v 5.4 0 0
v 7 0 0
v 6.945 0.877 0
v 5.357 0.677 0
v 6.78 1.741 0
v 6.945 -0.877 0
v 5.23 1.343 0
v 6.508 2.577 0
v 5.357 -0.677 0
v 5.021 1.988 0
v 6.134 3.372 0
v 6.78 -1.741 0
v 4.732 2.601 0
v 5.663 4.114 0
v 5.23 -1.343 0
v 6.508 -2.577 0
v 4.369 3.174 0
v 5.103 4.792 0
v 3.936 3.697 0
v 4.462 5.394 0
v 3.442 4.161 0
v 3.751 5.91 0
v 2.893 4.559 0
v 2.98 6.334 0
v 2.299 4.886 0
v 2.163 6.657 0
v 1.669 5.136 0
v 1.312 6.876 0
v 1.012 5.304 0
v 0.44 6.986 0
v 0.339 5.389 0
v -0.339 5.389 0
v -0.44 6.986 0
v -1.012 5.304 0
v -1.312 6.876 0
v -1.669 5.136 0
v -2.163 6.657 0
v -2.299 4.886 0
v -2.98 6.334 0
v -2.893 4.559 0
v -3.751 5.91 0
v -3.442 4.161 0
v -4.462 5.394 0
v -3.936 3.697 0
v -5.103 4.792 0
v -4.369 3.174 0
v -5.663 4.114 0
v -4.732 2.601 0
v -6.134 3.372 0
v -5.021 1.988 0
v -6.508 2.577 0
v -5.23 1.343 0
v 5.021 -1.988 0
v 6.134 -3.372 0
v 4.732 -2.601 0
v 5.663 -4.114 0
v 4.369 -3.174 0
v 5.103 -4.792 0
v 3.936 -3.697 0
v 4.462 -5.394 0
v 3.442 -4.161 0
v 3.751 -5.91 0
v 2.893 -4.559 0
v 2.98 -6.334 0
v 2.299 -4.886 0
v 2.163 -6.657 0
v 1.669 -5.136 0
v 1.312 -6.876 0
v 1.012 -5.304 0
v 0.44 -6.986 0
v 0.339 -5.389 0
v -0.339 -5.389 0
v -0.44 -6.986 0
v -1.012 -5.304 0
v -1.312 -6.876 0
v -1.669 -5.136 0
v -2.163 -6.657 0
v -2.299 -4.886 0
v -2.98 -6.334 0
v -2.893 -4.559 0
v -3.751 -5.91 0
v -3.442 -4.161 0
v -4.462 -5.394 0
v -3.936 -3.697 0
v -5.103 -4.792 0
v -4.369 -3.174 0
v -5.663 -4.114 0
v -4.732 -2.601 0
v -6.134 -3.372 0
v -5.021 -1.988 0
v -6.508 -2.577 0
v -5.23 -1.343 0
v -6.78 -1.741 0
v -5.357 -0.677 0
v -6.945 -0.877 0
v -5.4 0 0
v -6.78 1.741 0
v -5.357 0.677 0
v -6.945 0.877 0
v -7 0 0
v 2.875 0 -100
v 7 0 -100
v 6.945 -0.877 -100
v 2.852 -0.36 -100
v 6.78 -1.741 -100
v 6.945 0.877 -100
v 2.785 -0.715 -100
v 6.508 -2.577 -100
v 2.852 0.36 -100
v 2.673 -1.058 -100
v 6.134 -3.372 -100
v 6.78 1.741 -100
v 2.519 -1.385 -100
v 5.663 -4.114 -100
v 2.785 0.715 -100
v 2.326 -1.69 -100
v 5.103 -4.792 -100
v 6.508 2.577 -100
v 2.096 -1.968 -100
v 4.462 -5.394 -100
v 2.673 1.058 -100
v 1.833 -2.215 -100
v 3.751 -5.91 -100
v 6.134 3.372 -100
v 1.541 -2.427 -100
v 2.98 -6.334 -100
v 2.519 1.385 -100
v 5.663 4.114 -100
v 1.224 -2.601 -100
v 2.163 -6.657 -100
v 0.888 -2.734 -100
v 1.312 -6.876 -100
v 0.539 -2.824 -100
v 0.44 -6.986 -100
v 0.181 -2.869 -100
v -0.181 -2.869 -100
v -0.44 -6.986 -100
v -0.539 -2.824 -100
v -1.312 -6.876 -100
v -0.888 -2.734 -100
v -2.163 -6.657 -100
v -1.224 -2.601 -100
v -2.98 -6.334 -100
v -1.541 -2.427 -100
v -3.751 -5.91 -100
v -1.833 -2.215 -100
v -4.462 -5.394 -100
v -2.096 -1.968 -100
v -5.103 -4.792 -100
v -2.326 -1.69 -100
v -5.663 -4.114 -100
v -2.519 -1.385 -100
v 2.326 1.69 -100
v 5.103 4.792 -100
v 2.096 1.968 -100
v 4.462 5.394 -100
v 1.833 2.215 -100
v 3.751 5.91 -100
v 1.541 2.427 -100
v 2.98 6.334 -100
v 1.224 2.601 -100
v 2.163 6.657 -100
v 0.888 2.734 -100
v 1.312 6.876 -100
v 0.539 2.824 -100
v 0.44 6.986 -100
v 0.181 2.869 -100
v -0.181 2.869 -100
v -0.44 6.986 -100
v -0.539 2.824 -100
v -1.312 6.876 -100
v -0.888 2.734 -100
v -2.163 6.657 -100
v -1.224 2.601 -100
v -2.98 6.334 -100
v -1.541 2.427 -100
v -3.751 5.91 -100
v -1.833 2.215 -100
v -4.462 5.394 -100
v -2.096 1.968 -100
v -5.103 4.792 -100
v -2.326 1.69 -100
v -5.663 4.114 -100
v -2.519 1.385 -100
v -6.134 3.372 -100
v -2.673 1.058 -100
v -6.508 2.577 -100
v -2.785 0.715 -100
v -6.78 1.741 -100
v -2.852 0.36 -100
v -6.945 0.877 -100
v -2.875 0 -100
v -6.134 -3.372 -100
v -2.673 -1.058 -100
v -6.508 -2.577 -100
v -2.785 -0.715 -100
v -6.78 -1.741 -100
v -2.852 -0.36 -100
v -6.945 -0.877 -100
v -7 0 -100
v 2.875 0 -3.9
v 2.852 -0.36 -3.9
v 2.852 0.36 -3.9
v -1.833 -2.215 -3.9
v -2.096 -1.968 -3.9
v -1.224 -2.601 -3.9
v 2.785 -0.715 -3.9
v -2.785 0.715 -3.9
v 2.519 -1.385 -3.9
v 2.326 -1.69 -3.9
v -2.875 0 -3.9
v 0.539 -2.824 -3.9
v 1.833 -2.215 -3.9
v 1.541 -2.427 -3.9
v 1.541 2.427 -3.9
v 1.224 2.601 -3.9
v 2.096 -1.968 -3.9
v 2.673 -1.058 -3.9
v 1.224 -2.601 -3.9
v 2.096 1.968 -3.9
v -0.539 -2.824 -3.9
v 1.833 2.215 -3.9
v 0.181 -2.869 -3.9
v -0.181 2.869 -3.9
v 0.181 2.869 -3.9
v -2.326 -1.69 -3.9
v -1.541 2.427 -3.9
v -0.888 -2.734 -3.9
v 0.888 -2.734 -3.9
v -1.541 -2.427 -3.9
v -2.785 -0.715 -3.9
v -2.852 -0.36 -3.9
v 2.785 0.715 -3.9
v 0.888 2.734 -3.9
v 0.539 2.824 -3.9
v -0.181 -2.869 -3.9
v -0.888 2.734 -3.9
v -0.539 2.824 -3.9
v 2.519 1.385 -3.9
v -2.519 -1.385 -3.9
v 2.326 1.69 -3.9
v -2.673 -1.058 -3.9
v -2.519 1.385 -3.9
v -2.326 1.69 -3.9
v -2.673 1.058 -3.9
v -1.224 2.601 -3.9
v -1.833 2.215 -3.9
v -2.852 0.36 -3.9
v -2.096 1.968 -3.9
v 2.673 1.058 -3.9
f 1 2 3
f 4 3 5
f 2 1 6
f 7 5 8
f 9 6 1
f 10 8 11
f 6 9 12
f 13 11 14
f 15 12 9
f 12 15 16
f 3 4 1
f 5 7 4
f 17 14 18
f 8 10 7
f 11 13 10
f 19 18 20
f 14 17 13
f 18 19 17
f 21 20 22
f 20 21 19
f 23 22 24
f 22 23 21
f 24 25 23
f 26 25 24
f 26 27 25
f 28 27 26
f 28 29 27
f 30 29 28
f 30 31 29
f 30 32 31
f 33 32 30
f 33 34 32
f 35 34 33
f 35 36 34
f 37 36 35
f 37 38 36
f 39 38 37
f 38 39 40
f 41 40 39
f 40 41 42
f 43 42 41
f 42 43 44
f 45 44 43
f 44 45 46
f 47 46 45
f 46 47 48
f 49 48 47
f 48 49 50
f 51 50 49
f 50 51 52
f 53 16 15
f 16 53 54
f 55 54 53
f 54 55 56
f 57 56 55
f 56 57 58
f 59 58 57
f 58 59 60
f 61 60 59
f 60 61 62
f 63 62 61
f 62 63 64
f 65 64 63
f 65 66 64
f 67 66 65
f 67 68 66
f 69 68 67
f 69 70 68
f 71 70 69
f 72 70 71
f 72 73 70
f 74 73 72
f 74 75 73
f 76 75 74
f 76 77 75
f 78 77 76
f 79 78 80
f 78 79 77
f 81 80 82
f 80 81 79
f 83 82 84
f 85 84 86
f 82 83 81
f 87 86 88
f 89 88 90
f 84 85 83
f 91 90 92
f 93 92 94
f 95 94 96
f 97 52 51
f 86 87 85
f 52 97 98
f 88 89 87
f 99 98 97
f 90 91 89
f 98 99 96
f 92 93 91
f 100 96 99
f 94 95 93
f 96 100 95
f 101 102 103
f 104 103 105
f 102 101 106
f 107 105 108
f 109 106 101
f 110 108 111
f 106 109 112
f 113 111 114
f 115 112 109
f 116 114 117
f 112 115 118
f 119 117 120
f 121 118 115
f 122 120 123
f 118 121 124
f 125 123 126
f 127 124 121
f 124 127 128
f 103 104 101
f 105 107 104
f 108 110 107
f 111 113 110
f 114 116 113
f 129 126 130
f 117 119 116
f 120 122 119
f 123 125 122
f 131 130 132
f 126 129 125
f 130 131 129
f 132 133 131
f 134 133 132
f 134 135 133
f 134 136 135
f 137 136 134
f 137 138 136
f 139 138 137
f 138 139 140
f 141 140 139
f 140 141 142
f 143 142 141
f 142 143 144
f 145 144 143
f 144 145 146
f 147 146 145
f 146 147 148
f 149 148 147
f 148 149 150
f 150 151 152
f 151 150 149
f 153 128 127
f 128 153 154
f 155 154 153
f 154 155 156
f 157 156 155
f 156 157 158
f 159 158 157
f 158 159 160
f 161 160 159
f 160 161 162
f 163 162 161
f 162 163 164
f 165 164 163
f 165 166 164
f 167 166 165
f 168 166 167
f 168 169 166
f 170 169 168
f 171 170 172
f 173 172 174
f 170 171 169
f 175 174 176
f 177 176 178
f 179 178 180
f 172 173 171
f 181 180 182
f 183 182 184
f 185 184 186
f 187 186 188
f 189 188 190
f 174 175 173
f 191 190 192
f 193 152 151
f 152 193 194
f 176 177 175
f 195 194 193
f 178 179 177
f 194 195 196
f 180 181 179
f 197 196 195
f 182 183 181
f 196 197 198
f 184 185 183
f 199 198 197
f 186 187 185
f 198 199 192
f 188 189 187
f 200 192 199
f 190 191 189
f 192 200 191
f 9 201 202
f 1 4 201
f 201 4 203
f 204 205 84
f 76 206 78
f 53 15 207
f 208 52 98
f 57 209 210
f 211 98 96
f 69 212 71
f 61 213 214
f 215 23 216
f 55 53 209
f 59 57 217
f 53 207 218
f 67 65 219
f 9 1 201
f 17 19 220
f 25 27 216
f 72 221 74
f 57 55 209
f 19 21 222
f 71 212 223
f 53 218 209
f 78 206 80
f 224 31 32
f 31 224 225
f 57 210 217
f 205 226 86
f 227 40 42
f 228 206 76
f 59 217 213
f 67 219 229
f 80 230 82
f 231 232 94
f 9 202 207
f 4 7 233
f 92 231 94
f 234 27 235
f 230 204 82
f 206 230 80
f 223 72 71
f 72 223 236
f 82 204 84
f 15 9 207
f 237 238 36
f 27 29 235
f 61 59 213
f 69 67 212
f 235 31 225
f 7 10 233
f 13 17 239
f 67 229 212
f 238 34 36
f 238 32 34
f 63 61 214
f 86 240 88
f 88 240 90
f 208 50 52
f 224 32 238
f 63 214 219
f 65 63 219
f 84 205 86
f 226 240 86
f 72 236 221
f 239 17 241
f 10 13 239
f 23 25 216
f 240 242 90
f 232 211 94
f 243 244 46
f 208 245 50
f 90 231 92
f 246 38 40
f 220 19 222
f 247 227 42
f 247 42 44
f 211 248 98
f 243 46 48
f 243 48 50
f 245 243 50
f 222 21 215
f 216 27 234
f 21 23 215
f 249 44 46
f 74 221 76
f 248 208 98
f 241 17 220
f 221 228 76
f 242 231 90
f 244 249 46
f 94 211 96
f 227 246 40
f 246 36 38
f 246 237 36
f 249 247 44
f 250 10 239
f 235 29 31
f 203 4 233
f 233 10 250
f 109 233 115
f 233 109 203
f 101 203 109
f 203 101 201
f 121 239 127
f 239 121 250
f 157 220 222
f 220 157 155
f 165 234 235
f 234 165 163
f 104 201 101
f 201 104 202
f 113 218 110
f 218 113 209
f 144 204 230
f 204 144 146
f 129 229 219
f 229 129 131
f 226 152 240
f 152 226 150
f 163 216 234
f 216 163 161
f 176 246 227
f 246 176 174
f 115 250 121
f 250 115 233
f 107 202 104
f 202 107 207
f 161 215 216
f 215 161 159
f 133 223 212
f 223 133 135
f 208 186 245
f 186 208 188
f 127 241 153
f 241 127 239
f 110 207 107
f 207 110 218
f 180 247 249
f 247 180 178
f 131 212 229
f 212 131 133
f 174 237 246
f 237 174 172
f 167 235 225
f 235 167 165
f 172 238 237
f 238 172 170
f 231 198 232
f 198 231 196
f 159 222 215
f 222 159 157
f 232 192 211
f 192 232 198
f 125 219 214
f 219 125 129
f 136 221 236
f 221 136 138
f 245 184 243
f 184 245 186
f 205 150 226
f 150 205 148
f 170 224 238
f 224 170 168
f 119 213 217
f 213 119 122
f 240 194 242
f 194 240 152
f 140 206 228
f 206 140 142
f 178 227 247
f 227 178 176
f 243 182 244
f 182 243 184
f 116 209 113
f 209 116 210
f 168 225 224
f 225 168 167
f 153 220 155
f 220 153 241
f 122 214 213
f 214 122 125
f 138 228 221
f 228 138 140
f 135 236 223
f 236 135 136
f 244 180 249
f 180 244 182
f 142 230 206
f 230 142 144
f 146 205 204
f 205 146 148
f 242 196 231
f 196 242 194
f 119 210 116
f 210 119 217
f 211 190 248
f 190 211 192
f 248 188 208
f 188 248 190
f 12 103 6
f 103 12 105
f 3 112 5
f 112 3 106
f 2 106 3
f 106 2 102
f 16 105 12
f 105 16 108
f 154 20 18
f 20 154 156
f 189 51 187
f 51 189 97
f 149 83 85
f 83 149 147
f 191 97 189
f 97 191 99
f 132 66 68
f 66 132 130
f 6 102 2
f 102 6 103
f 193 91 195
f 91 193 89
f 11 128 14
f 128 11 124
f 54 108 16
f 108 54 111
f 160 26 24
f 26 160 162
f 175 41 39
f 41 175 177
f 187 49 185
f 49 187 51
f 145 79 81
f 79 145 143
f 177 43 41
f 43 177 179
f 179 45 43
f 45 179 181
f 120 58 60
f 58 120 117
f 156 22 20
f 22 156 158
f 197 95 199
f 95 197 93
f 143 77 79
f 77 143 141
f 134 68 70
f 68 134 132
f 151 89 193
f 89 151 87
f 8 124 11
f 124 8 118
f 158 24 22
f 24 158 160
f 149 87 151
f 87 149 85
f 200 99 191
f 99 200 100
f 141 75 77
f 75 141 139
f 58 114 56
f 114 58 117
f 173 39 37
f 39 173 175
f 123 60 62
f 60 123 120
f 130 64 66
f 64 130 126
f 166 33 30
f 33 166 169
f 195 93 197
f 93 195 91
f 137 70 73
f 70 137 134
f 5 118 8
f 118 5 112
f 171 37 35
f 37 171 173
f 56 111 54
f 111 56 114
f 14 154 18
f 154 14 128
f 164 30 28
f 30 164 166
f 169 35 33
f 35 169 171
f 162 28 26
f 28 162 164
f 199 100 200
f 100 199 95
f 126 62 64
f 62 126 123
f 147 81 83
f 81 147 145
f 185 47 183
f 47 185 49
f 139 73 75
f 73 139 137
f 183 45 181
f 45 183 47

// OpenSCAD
$fn = 50;


difference() {
	union() {
		translate(v = [0, 0, -100.0000000000]) {
			cylinder(h = 100, r = 7.0000000000);
		}
		cylinder(h = 0, r = 17.0000000000);
	}
	union() {
		translate(v = [0, 0, 0]) {
			rotate(a = [0, 0, 0]) {
				difference() {
					union() {
						#translate(v = [0, 0, -100.0000000000]) {
							cylinder(h = 100, r = 2.6000000000);
						}
						#translate(v = [0, 0, -3.9000000000]) {
							cylinder(h = 3.9000000000, r = 7.0000000000, r1 = 2.8750000000, r2 = 5.4000000000);
						}
						#translate(v = [0, 0, -100.0000000000]) {
							cylinder(h = 100, r = 2.8750000000);
						}
						#translate(v = [0, 0, -100.0000000000]) {
							cylinder(h = 100, r = 2.6000000000);
						}
					}
					union();
				}
			}
		}
	}
}
